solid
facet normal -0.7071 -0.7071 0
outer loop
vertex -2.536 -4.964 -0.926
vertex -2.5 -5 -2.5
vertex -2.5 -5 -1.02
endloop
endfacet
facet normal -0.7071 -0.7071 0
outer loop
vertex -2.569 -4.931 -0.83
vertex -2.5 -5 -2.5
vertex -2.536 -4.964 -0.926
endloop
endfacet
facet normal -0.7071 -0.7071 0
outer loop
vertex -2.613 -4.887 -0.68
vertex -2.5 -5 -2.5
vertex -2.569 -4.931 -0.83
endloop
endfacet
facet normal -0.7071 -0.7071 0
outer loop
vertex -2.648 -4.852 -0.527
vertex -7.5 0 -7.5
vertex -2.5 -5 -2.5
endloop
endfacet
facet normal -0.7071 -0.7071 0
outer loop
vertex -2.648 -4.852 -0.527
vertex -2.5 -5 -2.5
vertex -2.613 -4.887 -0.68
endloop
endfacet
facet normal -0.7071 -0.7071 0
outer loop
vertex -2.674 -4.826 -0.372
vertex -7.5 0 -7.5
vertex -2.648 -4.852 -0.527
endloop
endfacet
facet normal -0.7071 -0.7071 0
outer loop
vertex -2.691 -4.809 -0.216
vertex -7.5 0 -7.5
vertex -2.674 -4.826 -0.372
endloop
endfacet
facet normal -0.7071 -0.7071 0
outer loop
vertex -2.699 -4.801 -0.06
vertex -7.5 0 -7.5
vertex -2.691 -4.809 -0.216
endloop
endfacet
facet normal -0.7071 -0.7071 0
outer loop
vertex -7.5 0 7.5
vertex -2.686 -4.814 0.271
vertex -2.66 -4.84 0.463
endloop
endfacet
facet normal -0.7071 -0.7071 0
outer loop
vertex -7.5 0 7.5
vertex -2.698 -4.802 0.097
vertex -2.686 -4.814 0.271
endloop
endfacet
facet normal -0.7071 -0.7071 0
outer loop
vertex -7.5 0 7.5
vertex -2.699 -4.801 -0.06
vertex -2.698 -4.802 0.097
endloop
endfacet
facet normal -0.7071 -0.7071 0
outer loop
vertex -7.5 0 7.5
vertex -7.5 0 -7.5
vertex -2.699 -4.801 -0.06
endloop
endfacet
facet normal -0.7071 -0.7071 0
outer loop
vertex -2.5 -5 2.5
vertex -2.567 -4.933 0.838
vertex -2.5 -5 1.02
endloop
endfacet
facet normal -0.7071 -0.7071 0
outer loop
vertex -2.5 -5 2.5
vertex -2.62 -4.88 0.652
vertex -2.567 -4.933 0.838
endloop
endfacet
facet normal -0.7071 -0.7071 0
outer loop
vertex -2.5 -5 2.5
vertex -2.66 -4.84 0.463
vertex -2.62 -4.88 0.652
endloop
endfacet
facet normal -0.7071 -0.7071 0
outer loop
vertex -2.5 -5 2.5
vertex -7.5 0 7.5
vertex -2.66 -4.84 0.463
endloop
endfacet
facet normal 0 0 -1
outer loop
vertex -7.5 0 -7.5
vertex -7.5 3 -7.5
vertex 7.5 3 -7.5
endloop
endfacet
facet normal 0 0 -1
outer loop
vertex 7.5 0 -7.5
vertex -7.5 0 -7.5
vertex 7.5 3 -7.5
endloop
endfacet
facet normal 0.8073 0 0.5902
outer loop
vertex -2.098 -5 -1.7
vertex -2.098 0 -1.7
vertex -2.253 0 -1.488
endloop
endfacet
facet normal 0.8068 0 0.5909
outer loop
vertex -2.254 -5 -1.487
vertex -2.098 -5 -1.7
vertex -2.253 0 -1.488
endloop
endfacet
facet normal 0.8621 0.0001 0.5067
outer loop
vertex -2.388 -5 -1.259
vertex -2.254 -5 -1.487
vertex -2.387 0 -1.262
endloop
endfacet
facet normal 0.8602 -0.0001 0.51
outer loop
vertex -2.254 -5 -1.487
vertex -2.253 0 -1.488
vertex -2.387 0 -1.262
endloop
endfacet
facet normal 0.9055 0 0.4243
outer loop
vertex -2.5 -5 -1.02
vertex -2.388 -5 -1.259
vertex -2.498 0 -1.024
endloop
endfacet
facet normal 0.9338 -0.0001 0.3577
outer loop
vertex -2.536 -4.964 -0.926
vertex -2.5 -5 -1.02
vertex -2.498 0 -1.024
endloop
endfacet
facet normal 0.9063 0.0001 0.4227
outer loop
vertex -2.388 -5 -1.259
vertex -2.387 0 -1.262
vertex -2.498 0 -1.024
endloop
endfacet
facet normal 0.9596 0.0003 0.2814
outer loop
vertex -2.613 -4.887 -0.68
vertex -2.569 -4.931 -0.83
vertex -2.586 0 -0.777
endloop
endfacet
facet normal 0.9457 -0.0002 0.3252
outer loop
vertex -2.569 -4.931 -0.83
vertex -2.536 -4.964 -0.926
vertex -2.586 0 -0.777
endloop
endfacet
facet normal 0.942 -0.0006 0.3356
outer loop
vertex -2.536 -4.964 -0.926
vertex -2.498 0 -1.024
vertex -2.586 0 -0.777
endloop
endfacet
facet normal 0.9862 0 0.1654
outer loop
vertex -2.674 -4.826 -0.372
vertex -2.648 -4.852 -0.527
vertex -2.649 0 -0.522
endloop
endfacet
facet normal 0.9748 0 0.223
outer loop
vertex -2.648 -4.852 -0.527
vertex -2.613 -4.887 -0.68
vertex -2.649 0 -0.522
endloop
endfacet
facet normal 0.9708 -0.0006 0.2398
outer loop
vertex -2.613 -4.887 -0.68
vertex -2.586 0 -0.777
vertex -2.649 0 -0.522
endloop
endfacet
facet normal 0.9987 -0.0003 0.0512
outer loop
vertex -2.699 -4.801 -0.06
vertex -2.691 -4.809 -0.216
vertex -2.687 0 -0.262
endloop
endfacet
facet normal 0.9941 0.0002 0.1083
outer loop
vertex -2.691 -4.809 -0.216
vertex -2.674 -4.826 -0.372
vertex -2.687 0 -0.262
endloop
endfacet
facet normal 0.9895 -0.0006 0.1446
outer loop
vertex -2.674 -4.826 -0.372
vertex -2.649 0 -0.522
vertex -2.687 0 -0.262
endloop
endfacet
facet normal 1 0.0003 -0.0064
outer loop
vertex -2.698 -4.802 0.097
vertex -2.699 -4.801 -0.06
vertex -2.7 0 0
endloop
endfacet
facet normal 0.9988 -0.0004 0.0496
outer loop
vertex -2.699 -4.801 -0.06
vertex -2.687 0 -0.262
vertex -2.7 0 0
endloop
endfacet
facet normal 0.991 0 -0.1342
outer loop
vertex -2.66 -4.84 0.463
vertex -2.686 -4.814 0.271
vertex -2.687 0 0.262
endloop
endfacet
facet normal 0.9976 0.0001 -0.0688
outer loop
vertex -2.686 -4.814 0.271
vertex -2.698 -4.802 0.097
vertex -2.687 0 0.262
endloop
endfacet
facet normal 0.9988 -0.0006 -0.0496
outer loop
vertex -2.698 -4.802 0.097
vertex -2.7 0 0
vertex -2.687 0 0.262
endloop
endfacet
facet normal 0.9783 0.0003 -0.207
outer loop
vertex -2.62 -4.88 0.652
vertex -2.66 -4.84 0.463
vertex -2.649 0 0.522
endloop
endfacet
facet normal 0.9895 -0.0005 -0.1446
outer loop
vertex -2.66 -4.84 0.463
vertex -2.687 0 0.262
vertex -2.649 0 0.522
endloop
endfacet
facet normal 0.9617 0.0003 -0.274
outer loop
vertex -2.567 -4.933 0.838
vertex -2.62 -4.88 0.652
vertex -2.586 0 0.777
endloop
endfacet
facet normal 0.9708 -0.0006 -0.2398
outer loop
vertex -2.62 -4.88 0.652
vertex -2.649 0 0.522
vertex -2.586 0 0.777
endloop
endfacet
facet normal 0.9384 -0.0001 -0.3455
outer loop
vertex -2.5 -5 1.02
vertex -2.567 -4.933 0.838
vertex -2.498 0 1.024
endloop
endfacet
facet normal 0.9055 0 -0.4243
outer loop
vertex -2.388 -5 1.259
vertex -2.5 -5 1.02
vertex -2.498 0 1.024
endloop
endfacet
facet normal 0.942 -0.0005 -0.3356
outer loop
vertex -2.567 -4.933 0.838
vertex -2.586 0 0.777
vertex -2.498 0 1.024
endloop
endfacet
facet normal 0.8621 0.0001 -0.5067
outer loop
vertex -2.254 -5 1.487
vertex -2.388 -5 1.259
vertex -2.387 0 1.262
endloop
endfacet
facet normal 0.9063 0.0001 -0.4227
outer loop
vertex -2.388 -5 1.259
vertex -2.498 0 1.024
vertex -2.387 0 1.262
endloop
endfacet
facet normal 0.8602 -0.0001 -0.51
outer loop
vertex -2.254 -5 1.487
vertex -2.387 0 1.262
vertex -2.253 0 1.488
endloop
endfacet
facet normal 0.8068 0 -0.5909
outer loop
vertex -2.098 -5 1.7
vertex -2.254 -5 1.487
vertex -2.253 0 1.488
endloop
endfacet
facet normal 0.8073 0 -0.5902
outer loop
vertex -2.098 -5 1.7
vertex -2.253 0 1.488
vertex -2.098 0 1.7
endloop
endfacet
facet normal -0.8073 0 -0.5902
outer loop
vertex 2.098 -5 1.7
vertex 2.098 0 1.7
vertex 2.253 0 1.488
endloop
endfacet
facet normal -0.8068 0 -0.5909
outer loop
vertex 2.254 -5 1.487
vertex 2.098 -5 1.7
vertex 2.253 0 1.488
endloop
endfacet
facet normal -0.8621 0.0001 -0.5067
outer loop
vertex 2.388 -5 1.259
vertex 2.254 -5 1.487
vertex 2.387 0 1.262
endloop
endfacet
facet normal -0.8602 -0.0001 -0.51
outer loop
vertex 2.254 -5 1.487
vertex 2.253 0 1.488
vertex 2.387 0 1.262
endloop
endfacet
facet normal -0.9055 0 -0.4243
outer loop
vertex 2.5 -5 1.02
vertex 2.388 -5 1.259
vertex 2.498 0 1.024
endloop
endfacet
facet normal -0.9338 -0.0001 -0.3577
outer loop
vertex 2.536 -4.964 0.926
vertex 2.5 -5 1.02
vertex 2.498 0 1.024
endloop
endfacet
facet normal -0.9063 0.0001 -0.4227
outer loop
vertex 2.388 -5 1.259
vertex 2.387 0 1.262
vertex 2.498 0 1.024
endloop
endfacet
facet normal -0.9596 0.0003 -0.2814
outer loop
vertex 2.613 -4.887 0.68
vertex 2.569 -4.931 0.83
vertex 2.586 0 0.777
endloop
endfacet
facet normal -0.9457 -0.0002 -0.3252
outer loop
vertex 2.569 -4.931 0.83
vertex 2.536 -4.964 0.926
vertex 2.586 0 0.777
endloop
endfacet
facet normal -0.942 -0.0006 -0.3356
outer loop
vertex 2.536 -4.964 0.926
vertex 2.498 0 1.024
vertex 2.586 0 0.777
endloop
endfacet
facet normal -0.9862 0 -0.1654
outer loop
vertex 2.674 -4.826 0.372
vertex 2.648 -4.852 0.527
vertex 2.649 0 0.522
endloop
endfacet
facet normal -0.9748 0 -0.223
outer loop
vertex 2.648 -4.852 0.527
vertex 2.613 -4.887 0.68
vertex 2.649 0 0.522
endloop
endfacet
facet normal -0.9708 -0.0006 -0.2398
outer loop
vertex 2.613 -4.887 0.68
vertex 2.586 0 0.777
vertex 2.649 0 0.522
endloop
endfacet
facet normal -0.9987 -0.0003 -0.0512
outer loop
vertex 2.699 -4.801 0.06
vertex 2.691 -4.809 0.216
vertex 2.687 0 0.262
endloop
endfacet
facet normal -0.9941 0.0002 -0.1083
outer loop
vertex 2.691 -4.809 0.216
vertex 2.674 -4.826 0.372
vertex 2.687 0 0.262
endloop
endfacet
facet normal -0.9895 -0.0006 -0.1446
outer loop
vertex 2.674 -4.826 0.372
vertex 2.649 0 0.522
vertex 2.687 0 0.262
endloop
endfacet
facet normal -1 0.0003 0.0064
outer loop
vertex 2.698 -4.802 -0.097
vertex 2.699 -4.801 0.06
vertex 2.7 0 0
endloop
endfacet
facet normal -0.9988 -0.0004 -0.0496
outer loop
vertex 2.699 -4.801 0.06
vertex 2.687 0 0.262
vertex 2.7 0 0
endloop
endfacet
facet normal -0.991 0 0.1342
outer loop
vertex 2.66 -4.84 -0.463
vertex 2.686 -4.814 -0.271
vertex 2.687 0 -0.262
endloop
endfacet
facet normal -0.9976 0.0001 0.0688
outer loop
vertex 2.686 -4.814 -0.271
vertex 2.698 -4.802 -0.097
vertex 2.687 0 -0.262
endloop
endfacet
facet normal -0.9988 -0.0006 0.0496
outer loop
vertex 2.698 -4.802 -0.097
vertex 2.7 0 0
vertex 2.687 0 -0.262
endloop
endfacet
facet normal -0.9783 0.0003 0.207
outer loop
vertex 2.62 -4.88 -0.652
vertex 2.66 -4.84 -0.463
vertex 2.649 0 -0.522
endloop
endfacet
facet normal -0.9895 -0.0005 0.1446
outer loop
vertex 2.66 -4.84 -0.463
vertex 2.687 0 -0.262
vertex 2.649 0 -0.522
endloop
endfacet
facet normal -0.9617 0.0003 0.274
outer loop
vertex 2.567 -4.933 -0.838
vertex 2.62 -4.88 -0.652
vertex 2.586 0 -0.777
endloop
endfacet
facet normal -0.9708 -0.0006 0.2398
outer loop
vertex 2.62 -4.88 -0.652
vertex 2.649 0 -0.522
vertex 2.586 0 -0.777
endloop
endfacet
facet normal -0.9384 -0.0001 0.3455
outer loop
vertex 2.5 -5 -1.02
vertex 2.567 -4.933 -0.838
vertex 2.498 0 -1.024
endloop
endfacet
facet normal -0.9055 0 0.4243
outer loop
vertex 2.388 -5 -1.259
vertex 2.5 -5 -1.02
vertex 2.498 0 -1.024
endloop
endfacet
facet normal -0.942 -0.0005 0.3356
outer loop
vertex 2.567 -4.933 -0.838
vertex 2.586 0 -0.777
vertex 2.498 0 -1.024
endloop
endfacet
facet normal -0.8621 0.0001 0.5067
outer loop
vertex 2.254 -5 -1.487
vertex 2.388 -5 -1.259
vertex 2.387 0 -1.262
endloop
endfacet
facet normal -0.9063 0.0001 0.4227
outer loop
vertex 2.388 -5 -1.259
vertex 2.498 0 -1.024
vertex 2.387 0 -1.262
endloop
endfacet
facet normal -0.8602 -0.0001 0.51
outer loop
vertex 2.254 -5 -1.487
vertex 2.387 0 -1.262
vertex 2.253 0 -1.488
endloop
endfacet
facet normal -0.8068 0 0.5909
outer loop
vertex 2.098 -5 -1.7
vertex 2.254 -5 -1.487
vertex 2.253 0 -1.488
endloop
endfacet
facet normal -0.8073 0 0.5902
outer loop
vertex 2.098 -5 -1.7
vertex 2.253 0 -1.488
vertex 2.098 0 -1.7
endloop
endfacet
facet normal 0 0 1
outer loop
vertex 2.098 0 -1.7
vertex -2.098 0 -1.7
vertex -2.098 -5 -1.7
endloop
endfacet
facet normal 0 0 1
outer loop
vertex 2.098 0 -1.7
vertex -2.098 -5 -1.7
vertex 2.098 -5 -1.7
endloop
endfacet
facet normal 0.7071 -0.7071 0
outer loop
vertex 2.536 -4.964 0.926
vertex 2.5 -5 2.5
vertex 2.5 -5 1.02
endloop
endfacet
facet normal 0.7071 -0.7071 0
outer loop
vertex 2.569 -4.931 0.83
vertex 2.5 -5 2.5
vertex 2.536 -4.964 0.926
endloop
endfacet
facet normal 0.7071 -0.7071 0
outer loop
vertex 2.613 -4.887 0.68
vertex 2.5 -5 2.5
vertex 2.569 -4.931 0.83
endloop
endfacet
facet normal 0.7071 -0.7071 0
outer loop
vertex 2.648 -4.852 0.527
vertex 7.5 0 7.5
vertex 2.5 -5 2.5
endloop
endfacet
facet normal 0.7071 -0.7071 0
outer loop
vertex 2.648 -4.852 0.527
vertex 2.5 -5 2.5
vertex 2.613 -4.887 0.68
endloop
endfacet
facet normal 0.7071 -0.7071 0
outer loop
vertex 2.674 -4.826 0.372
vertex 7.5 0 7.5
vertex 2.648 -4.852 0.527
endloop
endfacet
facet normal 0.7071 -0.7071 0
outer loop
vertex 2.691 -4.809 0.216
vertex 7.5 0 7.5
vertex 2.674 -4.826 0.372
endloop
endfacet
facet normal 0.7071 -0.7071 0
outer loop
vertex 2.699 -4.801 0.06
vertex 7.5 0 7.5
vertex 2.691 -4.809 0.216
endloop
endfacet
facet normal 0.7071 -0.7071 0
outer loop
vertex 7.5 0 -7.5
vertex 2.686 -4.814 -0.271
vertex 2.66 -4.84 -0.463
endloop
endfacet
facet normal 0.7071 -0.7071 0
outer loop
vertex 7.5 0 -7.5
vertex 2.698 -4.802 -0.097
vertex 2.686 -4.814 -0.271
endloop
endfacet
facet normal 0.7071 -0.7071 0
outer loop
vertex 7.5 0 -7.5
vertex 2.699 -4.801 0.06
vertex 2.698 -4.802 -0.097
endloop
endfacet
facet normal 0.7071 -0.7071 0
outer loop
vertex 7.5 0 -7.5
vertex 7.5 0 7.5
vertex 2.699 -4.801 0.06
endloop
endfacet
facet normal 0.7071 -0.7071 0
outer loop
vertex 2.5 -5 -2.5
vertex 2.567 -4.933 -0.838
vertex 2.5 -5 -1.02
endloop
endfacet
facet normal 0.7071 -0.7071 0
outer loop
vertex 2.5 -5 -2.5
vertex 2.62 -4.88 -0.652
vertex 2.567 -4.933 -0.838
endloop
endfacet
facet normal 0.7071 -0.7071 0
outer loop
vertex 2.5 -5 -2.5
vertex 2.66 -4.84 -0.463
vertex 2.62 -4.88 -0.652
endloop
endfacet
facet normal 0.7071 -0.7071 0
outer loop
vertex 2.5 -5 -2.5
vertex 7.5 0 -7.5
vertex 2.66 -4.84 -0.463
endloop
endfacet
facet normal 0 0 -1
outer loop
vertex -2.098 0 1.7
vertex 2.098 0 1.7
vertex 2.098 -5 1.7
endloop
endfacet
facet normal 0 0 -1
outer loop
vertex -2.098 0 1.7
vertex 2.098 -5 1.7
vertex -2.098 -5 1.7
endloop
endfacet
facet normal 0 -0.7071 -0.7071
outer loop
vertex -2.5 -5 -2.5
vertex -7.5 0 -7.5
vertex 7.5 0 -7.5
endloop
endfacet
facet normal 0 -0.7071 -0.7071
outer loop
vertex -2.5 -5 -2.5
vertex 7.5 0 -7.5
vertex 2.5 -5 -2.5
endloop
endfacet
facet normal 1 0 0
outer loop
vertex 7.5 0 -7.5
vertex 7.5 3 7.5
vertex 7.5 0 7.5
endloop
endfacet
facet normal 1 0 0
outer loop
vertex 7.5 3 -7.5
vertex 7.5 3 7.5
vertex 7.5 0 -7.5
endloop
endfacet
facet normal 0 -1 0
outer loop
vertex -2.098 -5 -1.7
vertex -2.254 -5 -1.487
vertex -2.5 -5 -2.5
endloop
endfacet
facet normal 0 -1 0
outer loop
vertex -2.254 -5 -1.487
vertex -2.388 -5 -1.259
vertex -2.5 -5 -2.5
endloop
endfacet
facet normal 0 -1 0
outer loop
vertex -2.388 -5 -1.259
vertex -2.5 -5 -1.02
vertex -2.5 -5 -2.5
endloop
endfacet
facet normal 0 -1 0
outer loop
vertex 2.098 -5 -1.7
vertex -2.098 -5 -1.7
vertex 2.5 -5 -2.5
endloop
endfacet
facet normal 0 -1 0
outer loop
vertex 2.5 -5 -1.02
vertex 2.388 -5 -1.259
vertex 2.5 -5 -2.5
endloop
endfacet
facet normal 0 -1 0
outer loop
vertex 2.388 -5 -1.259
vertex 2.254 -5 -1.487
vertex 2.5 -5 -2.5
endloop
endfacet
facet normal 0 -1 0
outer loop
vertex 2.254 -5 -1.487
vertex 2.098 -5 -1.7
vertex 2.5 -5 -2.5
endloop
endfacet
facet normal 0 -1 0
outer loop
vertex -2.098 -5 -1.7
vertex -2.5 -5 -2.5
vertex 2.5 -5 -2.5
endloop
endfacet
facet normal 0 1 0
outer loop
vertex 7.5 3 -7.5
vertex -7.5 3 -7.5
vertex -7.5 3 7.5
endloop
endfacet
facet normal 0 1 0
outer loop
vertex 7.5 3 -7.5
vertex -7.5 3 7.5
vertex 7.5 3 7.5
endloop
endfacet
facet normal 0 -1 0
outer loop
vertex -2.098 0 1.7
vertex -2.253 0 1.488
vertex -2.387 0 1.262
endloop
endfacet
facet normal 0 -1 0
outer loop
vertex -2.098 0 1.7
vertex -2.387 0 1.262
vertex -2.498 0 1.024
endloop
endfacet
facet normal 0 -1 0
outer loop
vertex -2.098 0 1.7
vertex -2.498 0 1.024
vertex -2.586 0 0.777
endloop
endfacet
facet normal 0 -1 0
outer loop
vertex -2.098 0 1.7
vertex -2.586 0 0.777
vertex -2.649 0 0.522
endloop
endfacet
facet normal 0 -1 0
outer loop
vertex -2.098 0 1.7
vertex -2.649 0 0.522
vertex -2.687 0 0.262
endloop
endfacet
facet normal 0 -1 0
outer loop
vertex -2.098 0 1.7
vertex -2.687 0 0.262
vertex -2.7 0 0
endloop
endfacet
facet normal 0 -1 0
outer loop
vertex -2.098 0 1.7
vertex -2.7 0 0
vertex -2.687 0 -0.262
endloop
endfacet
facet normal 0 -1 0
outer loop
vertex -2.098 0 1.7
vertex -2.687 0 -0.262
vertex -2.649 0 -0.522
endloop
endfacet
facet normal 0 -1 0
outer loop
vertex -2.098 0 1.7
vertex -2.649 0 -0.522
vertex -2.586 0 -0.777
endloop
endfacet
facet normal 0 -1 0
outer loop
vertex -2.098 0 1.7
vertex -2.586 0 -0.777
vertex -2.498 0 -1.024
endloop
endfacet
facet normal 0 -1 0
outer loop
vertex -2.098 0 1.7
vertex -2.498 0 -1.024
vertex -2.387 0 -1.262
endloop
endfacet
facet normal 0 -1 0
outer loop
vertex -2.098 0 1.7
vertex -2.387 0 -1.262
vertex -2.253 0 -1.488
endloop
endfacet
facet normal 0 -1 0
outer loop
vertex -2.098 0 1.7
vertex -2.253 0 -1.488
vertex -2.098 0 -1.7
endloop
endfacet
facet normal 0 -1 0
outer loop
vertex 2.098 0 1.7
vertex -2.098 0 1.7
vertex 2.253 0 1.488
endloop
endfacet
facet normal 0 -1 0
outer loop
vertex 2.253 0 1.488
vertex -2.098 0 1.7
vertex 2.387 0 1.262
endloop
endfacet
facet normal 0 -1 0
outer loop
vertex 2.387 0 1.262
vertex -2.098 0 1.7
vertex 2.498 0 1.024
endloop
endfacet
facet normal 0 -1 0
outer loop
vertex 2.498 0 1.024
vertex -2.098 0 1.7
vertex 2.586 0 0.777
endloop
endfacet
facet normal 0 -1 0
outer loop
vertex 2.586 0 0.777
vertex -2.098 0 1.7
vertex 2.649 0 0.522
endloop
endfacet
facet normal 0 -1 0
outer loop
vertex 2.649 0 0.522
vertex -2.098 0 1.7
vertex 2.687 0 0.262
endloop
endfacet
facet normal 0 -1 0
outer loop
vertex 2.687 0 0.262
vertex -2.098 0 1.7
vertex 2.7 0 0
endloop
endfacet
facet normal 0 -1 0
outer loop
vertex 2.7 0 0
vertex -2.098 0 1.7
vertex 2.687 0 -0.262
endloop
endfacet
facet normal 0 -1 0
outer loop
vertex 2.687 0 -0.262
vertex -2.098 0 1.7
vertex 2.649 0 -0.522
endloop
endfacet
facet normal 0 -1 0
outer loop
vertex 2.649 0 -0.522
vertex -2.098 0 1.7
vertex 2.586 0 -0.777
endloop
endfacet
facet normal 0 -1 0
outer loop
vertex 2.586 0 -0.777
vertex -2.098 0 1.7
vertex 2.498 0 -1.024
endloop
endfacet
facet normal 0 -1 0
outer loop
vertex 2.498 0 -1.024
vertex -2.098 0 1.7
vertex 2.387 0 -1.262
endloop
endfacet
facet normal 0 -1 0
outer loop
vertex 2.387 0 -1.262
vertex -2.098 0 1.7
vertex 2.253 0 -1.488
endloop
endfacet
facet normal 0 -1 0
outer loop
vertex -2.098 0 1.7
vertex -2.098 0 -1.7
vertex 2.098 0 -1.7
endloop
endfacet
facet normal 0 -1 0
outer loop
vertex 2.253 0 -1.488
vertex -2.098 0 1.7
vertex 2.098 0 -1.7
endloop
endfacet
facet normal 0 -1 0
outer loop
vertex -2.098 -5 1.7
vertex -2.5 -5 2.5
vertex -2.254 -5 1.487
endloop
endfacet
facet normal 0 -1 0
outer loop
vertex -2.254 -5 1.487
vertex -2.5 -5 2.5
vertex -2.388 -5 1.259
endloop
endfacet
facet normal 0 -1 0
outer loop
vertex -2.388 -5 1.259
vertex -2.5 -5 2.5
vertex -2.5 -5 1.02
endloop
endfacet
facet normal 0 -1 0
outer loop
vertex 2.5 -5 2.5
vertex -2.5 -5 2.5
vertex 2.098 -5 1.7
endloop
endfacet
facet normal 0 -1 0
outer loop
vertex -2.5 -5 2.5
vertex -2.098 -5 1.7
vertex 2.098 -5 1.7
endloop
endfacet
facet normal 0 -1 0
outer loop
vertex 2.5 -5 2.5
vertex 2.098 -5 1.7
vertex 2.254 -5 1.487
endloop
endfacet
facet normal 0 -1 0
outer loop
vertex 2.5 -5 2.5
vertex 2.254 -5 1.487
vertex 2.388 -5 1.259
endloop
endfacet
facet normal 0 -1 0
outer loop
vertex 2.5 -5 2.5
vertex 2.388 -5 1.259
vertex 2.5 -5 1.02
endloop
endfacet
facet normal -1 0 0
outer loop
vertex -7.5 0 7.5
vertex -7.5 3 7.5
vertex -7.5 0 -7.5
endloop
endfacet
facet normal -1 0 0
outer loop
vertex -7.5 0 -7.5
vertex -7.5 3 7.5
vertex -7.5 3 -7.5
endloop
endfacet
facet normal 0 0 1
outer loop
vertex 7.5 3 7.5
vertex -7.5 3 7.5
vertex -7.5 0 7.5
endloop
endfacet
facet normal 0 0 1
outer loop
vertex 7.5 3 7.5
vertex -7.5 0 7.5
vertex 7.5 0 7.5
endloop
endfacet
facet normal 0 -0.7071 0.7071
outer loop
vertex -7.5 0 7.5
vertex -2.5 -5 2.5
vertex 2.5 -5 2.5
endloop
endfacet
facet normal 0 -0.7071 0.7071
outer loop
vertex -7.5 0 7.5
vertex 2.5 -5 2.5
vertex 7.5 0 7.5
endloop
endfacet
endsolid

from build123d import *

# Parameters (mm, degrees)
SKETCH1_W           = 15
SKETCH1_H           = 15
SKETCH1_R           = 2.7
BOSS_EXTRUDE1_DEPTH = 5
BOSS_EXTRUDE2_START = 3
SKETCH1_3_W         = 15
SKETCH1_3_H         = 15
SKETCH1_3_R         = 2.7
BOSS_EXTRUDE2_DEPTH = 3
CHAMFER1_SIZE       = 5


with BuildPart() as part:
    # Sketch1 → Boss-Extrude1 (new body)
    # profile 1 of 3: a face of its own
    with BuildSketch(Plane(origin=(0, 0, 0), x_dir=(1, 0, 0), z_dir=(0, 1, 0))):
        Rectangle(SKETCH1_W, SKETCH1_H)
        Circle(SKETCH1_R, mode=Mode.SUBTRACT)
    # profile 2 of 3: a face of its own
    with BuildSketch(Plane(origin=(0, 0, 0), x_dir=(1, 0, 0), z_dir=(0, 1, 0))):
        with BuildLine():
            ThreePointArc((2.097617696, 1.7), (0, 2.7), (-2.097617696, 1.7))
            Line((-2.097617696, 1.7), (2.097617696, 1.7))
        make_face()
    # profile 3 of 3: a face of its own
    with BuildSketch(Plane(origin=(0, 0, 0), x_dir=(1, 0, 0), z_dir=(0, 1, 0))):
        with BuildLine():
            Line((2.097617696, -1.7), (-2.097617696, -1.7))
            ThreePointArc((-2.097617696, -1.7), (0, -2.7), (2.097617696, -1.7))
        make_face()
    extrude(amount=-BOSS_EXTRUDE1_DEPTH)

    # Sketch1<3> → Boss-Extrude2 (add)
    # profile 1 of 4: a face of its own
    with BuildSketch(Plane(origin=(0, 0, 0), x_dir=(1, 0, 0), z_dir=(0, 1, 0)).offset(BOSS_EXTRUDE2_START)):
        Rectangle(SKETCH1_3_W, SKETCH1_3_H)
        Circle(SKETCH1_3_R, mode=Mode.SUBTRACT)
    # profile 2 of 4: a face of its own
    with BuildSketch(Plane(origin=(0, 0, 0), x_dir=(1, 0, 0), z_dir=(0, 1, 0)).offset(BOSS_EXTRUDE2_START)):
        with BuildLine():
            ThreePointArc((2.097617696, 1.7), (0, 2.7), (-2.097617696, 1.7))
            Line((-2.097617696, 1.7), (2.097617696, 1.7))
        make_face()
    # profile 3 of 4: a face of its own
    with BuildSketch(Plane(origin=(0, 0, 0), x_dir=(1, 0, 0), z_dir=(0, 1, 0)).offset(BOSS_EXTRUDE2_START)):
        with BuildLine():
            Line((2.097617696, 1.7), (-2.097617696, 1.7))
            ThreePointArc((-2.097617696, 1.7), (-2.7, 0), (-2.097617696, -1.7))
            Line((-2.097617696, -1.7), (2.097617696, -1.7))
            ThreePointArc((2.097617696, -1.7), (2.54495263, -0.901784958), (2.7, 0))
            ThreePointArc((2.7, 0), (2.54495263, 0.901784958), (2.097617696, 1.7))
        make_face()
    # profile 4 of 4: a face of its own
    with BuildSketch(Plane(origin=(0, 0, 0), x_dir=(1, 0, 0), z_dir=(0, 1, 0)).offset(BOSS_EXTRUDE2_START)):
        with BuildLine():
            Line((2.097617696, -1.7), (-2.097617696, -1.7))
            ThreePointArc((-2.097617696, -1.7), (0, -2.7), (2.097617696, -1.7))
        make_face()
    extrude(amount=-BOSS_EXTRUDE2_DEPTH)

    # Chamfer1
    # the kernel refuses this chamfer: 5 mm, written as the material it takes off along each edge
    with BuildSketch(Plane(origin=(-7.5, -5, 20.35841494), x_dir=(-0.027495876610586317, 0.9996219169112968, 0), z_dir=(0, 0, -1)), Plane(origin=(7.5, -5, -20.35841494), x_dir=(0.027495876610586317, 0.9996219169112968, 0), z_dir=(0, 0, 1)), Plane(origin=(-20.35841494, -5, -7.5), x_dir=(0, 0.9996219169112968, -0.027495876610586317), z_dir=(1, 0, 0))) as chamfer1_piece_1:
        Polygon((CHAMFER1_SIZE * 0.999621916911, CHAMFER1_SIZE * 0.0274958766106), (-CHAMFER1_SIZE * 0.0274958766106, CHAMFER1_SIZE * 0.999621916911), (0, 0), align=None)
    extrude(amount=40.71682988, mode=Mode.SUBTRACT)
    with BuildSketch(Plane(origin=(20.35841494, -5, 7.5), x_dir=(0, -0.027495876610586317, -0.9996219169112968), z_dir=(-1, 0, 0))) as chamfer1_piece_2:
        Polygon((CHAMFER1_SIZE * 0.999621916911, -CHAMFER1_SIZE * 0.0274958766106), (-CHAMFER1_SIZE * 0.0274958766106, -CHAMFER1_SIZE * 0.999621916911), (0, 0), align=None)
    extrude(amount=40.71682988, mode=Mode.SUBTRACT)


solid = part.part
